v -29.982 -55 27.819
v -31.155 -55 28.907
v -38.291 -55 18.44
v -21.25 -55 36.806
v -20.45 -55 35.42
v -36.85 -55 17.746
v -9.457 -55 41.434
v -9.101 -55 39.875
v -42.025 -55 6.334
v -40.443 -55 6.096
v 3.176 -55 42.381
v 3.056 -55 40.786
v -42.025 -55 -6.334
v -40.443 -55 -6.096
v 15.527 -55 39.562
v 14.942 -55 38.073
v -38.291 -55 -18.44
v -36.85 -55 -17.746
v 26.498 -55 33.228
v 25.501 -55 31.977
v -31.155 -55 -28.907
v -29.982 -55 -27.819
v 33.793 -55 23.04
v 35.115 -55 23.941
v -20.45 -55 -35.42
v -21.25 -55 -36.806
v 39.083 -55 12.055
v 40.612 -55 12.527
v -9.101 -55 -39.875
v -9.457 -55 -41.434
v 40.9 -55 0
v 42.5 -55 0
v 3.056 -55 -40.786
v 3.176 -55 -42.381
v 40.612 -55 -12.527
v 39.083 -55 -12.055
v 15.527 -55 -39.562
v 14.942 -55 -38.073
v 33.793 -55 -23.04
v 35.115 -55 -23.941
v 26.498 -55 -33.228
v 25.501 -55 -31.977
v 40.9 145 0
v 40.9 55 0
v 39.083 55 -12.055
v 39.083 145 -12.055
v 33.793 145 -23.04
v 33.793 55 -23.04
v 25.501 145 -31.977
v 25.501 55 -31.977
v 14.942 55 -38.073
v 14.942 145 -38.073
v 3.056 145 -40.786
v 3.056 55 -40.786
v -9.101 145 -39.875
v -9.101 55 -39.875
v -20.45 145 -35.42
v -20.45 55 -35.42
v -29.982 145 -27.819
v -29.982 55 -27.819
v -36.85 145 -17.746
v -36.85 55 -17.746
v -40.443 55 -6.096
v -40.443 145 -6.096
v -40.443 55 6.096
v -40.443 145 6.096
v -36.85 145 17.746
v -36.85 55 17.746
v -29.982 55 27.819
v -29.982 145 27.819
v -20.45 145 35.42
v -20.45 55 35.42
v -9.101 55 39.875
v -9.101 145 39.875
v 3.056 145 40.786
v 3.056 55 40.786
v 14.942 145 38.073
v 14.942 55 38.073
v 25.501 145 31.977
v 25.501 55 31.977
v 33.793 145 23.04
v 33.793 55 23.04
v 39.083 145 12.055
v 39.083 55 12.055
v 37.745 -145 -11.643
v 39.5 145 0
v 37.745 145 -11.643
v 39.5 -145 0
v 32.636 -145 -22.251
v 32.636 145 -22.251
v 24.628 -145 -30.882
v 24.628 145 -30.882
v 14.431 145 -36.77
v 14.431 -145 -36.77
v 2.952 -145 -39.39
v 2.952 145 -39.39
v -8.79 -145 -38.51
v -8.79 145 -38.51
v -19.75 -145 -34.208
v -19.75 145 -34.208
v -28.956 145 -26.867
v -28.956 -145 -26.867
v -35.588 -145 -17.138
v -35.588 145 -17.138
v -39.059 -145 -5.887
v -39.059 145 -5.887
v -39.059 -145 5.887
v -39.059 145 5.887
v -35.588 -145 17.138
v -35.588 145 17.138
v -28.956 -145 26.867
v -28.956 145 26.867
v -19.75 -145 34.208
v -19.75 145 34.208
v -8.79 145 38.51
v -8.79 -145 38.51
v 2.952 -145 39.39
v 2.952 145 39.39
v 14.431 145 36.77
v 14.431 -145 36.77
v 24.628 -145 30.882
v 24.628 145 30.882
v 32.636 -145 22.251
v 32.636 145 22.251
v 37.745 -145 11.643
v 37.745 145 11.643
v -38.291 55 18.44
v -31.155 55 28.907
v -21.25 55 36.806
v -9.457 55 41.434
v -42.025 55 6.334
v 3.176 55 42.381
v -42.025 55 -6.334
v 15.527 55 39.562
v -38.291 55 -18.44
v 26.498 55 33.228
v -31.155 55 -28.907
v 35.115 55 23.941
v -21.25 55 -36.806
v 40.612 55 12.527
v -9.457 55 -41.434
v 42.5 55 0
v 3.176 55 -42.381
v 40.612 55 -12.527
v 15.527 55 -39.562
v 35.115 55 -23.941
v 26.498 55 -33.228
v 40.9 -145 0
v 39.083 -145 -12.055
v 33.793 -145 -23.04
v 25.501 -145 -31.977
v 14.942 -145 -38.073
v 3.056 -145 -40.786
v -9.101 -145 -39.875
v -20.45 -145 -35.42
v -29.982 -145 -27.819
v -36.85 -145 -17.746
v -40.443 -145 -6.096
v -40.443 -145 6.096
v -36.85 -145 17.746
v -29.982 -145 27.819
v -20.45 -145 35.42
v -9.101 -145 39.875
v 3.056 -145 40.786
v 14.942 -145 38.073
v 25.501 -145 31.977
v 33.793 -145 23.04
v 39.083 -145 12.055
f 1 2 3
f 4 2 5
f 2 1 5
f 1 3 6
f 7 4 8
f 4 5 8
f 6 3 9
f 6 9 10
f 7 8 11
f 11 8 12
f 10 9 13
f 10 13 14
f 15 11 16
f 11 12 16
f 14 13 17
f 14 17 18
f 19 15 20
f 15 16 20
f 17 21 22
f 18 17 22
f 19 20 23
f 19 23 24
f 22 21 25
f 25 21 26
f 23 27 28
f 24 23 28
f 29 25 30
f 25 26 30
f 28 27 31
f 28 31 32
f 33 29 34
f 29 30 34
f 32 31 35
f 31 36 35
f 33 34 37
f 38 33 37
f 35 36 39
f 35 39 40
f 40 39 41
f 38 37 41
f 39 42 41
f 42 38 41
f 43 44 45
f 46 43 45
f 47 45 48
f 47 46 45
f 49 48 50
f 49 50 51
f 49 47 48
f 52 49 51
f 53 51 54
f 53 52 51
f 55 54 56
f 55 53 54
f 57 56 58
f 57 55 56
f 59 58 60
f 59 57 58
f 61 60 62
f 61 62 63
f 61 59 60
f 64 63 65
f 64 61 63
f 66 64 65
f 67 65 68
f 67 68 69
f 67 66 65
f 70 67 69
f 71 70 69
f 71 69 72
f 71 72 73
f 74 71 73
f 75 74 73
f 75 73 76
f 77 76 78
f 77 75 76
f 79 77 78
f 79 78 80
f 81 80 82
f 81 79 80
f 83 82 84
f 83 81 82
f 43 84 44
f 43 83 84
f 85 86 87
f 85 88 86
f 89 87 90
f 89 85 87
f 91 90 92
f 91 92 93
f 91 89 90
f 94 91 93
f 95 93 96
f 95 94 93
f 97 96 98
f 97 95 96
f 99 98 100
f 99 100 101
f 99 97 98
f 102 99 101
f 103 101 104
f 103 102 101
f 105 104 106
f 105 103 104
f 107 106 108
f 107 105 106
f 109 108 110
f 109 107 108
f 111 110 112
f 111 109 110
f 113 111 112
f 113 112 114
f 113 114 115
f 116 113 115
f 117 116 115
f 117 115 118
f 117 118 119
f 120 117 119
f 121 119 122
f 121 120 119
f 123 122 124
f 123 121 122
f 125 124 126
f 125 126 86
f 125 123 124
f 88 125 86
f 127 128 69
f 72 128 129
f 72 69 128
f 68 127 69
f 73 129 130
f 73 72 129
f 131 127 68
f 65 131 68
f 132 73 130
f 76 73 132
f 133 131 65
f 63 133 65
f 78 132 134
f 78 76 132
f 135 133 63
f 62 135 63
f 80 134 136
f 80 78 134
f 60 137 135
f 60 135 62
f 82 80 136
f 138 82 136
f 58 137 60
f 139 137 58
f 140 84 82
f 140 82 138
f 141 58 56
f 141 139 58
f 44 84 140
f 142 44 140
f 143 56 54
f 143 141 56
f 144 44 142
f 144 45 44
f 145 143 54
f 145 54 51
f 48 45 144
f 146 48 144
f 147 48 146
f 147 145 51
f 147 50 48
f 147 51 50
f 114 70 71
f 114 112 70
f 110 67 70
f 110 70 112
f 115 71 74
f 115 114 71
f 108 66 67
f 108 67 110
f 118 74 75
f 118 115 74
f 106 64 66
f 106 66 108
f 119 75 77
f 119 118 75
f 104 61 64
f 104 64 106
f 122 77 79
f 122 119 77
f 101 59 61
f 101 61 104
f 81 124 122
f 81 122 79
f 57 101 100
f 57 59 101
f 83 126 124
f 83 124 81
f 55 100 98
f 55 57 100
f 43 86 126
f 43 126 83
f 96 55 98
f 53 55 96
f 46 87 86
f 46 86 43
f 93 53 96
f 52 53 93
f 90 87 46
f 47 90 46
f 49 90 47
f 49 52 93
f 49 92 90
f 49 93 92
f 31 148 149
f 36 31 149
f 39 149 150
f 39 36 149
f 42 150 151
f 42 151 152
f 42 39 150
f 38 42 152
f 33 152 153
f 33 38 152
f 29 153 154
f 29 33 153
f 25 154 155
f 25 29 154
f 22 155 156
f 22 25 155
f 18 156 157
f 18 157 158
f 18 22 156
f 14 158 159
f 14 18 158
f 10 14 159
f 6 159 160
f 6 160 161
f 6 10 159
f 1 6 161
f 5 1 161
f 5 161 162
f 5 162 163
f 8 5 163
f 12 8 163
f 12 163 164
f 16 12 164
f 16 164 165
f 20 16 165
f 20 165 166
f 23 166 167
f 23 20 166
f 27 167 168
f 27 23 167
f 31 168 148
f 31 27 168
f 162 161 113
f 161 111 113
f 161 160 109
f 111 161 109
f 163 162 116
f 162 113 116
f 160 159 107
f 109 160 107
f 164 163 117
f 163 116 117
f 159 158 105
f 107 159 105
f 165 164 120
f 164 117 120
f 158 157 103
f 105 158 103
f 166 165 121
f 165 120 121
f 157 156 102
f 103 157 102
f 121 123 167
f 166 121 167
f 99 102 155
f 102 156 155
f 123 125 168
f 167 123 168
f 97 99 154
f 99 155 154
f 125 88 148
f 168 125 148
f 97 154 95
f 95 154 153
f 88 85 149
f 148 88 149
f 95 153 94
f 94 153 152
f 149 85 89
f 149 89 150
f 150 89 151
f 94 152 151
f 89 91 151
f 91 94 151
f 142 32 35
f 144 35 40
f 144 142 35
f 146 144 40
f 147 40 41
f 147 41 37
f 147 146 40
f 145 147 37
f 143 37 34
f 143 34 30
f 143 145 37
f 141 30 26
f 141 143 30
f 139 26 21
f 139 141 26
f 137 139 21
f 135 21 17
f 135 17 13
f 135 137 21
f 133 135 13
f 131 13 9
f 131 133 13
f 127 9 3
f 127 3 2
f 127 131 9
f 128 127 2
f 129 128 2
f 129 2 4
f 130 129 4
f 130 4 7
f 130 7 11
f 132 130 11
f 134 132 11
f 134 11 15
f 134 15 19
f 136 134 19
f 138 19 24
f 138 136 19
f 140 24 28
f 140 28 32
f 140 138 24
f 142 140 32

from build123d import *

# Parameters (mm, degrees)
SKETCH1_R           = 40.9
SKETCH1_R_2         = 39.5
BOSS_EXTRUDE1_DEPTH = 145
SKETCH1_3_R         = 42.5
SKETCH1_3_R_2       = 40.9
BOSS_EXTRUDE2_DEPTH = 55


with BuildPart() as part:
    # Sketch1 → Boss-Extrude1 (new, symmetric)
    with BuildSketch(Plane(origin=(0, 0, 0), x_dir=(1, 0, 0), z_dir=(0, 1, 0))):
        Circle(SKETCH1_R)
        Circle(SKETCH1_R_2, mode=Mode.SUBTRACT)
    extrude(amount=BOSS_EXTRUDE1_DEPTH, both=True)

    # Sketch1<3> → Boss-Extrude2 (add, symmetric)
    with BuildSketch(Plane(origin=(0, 0, 0), x_dir=(1, 0, 0), z_dir=(0, 1, 0))):
        Circle(SKETCH1_3_R)
        Circle(SKETCH1_3_R_2, mode=Mode.SUBTRACT)
    extrude(amount=BOSS_EXTRUDE2_DEPTH, both=True)


solid = part.part
